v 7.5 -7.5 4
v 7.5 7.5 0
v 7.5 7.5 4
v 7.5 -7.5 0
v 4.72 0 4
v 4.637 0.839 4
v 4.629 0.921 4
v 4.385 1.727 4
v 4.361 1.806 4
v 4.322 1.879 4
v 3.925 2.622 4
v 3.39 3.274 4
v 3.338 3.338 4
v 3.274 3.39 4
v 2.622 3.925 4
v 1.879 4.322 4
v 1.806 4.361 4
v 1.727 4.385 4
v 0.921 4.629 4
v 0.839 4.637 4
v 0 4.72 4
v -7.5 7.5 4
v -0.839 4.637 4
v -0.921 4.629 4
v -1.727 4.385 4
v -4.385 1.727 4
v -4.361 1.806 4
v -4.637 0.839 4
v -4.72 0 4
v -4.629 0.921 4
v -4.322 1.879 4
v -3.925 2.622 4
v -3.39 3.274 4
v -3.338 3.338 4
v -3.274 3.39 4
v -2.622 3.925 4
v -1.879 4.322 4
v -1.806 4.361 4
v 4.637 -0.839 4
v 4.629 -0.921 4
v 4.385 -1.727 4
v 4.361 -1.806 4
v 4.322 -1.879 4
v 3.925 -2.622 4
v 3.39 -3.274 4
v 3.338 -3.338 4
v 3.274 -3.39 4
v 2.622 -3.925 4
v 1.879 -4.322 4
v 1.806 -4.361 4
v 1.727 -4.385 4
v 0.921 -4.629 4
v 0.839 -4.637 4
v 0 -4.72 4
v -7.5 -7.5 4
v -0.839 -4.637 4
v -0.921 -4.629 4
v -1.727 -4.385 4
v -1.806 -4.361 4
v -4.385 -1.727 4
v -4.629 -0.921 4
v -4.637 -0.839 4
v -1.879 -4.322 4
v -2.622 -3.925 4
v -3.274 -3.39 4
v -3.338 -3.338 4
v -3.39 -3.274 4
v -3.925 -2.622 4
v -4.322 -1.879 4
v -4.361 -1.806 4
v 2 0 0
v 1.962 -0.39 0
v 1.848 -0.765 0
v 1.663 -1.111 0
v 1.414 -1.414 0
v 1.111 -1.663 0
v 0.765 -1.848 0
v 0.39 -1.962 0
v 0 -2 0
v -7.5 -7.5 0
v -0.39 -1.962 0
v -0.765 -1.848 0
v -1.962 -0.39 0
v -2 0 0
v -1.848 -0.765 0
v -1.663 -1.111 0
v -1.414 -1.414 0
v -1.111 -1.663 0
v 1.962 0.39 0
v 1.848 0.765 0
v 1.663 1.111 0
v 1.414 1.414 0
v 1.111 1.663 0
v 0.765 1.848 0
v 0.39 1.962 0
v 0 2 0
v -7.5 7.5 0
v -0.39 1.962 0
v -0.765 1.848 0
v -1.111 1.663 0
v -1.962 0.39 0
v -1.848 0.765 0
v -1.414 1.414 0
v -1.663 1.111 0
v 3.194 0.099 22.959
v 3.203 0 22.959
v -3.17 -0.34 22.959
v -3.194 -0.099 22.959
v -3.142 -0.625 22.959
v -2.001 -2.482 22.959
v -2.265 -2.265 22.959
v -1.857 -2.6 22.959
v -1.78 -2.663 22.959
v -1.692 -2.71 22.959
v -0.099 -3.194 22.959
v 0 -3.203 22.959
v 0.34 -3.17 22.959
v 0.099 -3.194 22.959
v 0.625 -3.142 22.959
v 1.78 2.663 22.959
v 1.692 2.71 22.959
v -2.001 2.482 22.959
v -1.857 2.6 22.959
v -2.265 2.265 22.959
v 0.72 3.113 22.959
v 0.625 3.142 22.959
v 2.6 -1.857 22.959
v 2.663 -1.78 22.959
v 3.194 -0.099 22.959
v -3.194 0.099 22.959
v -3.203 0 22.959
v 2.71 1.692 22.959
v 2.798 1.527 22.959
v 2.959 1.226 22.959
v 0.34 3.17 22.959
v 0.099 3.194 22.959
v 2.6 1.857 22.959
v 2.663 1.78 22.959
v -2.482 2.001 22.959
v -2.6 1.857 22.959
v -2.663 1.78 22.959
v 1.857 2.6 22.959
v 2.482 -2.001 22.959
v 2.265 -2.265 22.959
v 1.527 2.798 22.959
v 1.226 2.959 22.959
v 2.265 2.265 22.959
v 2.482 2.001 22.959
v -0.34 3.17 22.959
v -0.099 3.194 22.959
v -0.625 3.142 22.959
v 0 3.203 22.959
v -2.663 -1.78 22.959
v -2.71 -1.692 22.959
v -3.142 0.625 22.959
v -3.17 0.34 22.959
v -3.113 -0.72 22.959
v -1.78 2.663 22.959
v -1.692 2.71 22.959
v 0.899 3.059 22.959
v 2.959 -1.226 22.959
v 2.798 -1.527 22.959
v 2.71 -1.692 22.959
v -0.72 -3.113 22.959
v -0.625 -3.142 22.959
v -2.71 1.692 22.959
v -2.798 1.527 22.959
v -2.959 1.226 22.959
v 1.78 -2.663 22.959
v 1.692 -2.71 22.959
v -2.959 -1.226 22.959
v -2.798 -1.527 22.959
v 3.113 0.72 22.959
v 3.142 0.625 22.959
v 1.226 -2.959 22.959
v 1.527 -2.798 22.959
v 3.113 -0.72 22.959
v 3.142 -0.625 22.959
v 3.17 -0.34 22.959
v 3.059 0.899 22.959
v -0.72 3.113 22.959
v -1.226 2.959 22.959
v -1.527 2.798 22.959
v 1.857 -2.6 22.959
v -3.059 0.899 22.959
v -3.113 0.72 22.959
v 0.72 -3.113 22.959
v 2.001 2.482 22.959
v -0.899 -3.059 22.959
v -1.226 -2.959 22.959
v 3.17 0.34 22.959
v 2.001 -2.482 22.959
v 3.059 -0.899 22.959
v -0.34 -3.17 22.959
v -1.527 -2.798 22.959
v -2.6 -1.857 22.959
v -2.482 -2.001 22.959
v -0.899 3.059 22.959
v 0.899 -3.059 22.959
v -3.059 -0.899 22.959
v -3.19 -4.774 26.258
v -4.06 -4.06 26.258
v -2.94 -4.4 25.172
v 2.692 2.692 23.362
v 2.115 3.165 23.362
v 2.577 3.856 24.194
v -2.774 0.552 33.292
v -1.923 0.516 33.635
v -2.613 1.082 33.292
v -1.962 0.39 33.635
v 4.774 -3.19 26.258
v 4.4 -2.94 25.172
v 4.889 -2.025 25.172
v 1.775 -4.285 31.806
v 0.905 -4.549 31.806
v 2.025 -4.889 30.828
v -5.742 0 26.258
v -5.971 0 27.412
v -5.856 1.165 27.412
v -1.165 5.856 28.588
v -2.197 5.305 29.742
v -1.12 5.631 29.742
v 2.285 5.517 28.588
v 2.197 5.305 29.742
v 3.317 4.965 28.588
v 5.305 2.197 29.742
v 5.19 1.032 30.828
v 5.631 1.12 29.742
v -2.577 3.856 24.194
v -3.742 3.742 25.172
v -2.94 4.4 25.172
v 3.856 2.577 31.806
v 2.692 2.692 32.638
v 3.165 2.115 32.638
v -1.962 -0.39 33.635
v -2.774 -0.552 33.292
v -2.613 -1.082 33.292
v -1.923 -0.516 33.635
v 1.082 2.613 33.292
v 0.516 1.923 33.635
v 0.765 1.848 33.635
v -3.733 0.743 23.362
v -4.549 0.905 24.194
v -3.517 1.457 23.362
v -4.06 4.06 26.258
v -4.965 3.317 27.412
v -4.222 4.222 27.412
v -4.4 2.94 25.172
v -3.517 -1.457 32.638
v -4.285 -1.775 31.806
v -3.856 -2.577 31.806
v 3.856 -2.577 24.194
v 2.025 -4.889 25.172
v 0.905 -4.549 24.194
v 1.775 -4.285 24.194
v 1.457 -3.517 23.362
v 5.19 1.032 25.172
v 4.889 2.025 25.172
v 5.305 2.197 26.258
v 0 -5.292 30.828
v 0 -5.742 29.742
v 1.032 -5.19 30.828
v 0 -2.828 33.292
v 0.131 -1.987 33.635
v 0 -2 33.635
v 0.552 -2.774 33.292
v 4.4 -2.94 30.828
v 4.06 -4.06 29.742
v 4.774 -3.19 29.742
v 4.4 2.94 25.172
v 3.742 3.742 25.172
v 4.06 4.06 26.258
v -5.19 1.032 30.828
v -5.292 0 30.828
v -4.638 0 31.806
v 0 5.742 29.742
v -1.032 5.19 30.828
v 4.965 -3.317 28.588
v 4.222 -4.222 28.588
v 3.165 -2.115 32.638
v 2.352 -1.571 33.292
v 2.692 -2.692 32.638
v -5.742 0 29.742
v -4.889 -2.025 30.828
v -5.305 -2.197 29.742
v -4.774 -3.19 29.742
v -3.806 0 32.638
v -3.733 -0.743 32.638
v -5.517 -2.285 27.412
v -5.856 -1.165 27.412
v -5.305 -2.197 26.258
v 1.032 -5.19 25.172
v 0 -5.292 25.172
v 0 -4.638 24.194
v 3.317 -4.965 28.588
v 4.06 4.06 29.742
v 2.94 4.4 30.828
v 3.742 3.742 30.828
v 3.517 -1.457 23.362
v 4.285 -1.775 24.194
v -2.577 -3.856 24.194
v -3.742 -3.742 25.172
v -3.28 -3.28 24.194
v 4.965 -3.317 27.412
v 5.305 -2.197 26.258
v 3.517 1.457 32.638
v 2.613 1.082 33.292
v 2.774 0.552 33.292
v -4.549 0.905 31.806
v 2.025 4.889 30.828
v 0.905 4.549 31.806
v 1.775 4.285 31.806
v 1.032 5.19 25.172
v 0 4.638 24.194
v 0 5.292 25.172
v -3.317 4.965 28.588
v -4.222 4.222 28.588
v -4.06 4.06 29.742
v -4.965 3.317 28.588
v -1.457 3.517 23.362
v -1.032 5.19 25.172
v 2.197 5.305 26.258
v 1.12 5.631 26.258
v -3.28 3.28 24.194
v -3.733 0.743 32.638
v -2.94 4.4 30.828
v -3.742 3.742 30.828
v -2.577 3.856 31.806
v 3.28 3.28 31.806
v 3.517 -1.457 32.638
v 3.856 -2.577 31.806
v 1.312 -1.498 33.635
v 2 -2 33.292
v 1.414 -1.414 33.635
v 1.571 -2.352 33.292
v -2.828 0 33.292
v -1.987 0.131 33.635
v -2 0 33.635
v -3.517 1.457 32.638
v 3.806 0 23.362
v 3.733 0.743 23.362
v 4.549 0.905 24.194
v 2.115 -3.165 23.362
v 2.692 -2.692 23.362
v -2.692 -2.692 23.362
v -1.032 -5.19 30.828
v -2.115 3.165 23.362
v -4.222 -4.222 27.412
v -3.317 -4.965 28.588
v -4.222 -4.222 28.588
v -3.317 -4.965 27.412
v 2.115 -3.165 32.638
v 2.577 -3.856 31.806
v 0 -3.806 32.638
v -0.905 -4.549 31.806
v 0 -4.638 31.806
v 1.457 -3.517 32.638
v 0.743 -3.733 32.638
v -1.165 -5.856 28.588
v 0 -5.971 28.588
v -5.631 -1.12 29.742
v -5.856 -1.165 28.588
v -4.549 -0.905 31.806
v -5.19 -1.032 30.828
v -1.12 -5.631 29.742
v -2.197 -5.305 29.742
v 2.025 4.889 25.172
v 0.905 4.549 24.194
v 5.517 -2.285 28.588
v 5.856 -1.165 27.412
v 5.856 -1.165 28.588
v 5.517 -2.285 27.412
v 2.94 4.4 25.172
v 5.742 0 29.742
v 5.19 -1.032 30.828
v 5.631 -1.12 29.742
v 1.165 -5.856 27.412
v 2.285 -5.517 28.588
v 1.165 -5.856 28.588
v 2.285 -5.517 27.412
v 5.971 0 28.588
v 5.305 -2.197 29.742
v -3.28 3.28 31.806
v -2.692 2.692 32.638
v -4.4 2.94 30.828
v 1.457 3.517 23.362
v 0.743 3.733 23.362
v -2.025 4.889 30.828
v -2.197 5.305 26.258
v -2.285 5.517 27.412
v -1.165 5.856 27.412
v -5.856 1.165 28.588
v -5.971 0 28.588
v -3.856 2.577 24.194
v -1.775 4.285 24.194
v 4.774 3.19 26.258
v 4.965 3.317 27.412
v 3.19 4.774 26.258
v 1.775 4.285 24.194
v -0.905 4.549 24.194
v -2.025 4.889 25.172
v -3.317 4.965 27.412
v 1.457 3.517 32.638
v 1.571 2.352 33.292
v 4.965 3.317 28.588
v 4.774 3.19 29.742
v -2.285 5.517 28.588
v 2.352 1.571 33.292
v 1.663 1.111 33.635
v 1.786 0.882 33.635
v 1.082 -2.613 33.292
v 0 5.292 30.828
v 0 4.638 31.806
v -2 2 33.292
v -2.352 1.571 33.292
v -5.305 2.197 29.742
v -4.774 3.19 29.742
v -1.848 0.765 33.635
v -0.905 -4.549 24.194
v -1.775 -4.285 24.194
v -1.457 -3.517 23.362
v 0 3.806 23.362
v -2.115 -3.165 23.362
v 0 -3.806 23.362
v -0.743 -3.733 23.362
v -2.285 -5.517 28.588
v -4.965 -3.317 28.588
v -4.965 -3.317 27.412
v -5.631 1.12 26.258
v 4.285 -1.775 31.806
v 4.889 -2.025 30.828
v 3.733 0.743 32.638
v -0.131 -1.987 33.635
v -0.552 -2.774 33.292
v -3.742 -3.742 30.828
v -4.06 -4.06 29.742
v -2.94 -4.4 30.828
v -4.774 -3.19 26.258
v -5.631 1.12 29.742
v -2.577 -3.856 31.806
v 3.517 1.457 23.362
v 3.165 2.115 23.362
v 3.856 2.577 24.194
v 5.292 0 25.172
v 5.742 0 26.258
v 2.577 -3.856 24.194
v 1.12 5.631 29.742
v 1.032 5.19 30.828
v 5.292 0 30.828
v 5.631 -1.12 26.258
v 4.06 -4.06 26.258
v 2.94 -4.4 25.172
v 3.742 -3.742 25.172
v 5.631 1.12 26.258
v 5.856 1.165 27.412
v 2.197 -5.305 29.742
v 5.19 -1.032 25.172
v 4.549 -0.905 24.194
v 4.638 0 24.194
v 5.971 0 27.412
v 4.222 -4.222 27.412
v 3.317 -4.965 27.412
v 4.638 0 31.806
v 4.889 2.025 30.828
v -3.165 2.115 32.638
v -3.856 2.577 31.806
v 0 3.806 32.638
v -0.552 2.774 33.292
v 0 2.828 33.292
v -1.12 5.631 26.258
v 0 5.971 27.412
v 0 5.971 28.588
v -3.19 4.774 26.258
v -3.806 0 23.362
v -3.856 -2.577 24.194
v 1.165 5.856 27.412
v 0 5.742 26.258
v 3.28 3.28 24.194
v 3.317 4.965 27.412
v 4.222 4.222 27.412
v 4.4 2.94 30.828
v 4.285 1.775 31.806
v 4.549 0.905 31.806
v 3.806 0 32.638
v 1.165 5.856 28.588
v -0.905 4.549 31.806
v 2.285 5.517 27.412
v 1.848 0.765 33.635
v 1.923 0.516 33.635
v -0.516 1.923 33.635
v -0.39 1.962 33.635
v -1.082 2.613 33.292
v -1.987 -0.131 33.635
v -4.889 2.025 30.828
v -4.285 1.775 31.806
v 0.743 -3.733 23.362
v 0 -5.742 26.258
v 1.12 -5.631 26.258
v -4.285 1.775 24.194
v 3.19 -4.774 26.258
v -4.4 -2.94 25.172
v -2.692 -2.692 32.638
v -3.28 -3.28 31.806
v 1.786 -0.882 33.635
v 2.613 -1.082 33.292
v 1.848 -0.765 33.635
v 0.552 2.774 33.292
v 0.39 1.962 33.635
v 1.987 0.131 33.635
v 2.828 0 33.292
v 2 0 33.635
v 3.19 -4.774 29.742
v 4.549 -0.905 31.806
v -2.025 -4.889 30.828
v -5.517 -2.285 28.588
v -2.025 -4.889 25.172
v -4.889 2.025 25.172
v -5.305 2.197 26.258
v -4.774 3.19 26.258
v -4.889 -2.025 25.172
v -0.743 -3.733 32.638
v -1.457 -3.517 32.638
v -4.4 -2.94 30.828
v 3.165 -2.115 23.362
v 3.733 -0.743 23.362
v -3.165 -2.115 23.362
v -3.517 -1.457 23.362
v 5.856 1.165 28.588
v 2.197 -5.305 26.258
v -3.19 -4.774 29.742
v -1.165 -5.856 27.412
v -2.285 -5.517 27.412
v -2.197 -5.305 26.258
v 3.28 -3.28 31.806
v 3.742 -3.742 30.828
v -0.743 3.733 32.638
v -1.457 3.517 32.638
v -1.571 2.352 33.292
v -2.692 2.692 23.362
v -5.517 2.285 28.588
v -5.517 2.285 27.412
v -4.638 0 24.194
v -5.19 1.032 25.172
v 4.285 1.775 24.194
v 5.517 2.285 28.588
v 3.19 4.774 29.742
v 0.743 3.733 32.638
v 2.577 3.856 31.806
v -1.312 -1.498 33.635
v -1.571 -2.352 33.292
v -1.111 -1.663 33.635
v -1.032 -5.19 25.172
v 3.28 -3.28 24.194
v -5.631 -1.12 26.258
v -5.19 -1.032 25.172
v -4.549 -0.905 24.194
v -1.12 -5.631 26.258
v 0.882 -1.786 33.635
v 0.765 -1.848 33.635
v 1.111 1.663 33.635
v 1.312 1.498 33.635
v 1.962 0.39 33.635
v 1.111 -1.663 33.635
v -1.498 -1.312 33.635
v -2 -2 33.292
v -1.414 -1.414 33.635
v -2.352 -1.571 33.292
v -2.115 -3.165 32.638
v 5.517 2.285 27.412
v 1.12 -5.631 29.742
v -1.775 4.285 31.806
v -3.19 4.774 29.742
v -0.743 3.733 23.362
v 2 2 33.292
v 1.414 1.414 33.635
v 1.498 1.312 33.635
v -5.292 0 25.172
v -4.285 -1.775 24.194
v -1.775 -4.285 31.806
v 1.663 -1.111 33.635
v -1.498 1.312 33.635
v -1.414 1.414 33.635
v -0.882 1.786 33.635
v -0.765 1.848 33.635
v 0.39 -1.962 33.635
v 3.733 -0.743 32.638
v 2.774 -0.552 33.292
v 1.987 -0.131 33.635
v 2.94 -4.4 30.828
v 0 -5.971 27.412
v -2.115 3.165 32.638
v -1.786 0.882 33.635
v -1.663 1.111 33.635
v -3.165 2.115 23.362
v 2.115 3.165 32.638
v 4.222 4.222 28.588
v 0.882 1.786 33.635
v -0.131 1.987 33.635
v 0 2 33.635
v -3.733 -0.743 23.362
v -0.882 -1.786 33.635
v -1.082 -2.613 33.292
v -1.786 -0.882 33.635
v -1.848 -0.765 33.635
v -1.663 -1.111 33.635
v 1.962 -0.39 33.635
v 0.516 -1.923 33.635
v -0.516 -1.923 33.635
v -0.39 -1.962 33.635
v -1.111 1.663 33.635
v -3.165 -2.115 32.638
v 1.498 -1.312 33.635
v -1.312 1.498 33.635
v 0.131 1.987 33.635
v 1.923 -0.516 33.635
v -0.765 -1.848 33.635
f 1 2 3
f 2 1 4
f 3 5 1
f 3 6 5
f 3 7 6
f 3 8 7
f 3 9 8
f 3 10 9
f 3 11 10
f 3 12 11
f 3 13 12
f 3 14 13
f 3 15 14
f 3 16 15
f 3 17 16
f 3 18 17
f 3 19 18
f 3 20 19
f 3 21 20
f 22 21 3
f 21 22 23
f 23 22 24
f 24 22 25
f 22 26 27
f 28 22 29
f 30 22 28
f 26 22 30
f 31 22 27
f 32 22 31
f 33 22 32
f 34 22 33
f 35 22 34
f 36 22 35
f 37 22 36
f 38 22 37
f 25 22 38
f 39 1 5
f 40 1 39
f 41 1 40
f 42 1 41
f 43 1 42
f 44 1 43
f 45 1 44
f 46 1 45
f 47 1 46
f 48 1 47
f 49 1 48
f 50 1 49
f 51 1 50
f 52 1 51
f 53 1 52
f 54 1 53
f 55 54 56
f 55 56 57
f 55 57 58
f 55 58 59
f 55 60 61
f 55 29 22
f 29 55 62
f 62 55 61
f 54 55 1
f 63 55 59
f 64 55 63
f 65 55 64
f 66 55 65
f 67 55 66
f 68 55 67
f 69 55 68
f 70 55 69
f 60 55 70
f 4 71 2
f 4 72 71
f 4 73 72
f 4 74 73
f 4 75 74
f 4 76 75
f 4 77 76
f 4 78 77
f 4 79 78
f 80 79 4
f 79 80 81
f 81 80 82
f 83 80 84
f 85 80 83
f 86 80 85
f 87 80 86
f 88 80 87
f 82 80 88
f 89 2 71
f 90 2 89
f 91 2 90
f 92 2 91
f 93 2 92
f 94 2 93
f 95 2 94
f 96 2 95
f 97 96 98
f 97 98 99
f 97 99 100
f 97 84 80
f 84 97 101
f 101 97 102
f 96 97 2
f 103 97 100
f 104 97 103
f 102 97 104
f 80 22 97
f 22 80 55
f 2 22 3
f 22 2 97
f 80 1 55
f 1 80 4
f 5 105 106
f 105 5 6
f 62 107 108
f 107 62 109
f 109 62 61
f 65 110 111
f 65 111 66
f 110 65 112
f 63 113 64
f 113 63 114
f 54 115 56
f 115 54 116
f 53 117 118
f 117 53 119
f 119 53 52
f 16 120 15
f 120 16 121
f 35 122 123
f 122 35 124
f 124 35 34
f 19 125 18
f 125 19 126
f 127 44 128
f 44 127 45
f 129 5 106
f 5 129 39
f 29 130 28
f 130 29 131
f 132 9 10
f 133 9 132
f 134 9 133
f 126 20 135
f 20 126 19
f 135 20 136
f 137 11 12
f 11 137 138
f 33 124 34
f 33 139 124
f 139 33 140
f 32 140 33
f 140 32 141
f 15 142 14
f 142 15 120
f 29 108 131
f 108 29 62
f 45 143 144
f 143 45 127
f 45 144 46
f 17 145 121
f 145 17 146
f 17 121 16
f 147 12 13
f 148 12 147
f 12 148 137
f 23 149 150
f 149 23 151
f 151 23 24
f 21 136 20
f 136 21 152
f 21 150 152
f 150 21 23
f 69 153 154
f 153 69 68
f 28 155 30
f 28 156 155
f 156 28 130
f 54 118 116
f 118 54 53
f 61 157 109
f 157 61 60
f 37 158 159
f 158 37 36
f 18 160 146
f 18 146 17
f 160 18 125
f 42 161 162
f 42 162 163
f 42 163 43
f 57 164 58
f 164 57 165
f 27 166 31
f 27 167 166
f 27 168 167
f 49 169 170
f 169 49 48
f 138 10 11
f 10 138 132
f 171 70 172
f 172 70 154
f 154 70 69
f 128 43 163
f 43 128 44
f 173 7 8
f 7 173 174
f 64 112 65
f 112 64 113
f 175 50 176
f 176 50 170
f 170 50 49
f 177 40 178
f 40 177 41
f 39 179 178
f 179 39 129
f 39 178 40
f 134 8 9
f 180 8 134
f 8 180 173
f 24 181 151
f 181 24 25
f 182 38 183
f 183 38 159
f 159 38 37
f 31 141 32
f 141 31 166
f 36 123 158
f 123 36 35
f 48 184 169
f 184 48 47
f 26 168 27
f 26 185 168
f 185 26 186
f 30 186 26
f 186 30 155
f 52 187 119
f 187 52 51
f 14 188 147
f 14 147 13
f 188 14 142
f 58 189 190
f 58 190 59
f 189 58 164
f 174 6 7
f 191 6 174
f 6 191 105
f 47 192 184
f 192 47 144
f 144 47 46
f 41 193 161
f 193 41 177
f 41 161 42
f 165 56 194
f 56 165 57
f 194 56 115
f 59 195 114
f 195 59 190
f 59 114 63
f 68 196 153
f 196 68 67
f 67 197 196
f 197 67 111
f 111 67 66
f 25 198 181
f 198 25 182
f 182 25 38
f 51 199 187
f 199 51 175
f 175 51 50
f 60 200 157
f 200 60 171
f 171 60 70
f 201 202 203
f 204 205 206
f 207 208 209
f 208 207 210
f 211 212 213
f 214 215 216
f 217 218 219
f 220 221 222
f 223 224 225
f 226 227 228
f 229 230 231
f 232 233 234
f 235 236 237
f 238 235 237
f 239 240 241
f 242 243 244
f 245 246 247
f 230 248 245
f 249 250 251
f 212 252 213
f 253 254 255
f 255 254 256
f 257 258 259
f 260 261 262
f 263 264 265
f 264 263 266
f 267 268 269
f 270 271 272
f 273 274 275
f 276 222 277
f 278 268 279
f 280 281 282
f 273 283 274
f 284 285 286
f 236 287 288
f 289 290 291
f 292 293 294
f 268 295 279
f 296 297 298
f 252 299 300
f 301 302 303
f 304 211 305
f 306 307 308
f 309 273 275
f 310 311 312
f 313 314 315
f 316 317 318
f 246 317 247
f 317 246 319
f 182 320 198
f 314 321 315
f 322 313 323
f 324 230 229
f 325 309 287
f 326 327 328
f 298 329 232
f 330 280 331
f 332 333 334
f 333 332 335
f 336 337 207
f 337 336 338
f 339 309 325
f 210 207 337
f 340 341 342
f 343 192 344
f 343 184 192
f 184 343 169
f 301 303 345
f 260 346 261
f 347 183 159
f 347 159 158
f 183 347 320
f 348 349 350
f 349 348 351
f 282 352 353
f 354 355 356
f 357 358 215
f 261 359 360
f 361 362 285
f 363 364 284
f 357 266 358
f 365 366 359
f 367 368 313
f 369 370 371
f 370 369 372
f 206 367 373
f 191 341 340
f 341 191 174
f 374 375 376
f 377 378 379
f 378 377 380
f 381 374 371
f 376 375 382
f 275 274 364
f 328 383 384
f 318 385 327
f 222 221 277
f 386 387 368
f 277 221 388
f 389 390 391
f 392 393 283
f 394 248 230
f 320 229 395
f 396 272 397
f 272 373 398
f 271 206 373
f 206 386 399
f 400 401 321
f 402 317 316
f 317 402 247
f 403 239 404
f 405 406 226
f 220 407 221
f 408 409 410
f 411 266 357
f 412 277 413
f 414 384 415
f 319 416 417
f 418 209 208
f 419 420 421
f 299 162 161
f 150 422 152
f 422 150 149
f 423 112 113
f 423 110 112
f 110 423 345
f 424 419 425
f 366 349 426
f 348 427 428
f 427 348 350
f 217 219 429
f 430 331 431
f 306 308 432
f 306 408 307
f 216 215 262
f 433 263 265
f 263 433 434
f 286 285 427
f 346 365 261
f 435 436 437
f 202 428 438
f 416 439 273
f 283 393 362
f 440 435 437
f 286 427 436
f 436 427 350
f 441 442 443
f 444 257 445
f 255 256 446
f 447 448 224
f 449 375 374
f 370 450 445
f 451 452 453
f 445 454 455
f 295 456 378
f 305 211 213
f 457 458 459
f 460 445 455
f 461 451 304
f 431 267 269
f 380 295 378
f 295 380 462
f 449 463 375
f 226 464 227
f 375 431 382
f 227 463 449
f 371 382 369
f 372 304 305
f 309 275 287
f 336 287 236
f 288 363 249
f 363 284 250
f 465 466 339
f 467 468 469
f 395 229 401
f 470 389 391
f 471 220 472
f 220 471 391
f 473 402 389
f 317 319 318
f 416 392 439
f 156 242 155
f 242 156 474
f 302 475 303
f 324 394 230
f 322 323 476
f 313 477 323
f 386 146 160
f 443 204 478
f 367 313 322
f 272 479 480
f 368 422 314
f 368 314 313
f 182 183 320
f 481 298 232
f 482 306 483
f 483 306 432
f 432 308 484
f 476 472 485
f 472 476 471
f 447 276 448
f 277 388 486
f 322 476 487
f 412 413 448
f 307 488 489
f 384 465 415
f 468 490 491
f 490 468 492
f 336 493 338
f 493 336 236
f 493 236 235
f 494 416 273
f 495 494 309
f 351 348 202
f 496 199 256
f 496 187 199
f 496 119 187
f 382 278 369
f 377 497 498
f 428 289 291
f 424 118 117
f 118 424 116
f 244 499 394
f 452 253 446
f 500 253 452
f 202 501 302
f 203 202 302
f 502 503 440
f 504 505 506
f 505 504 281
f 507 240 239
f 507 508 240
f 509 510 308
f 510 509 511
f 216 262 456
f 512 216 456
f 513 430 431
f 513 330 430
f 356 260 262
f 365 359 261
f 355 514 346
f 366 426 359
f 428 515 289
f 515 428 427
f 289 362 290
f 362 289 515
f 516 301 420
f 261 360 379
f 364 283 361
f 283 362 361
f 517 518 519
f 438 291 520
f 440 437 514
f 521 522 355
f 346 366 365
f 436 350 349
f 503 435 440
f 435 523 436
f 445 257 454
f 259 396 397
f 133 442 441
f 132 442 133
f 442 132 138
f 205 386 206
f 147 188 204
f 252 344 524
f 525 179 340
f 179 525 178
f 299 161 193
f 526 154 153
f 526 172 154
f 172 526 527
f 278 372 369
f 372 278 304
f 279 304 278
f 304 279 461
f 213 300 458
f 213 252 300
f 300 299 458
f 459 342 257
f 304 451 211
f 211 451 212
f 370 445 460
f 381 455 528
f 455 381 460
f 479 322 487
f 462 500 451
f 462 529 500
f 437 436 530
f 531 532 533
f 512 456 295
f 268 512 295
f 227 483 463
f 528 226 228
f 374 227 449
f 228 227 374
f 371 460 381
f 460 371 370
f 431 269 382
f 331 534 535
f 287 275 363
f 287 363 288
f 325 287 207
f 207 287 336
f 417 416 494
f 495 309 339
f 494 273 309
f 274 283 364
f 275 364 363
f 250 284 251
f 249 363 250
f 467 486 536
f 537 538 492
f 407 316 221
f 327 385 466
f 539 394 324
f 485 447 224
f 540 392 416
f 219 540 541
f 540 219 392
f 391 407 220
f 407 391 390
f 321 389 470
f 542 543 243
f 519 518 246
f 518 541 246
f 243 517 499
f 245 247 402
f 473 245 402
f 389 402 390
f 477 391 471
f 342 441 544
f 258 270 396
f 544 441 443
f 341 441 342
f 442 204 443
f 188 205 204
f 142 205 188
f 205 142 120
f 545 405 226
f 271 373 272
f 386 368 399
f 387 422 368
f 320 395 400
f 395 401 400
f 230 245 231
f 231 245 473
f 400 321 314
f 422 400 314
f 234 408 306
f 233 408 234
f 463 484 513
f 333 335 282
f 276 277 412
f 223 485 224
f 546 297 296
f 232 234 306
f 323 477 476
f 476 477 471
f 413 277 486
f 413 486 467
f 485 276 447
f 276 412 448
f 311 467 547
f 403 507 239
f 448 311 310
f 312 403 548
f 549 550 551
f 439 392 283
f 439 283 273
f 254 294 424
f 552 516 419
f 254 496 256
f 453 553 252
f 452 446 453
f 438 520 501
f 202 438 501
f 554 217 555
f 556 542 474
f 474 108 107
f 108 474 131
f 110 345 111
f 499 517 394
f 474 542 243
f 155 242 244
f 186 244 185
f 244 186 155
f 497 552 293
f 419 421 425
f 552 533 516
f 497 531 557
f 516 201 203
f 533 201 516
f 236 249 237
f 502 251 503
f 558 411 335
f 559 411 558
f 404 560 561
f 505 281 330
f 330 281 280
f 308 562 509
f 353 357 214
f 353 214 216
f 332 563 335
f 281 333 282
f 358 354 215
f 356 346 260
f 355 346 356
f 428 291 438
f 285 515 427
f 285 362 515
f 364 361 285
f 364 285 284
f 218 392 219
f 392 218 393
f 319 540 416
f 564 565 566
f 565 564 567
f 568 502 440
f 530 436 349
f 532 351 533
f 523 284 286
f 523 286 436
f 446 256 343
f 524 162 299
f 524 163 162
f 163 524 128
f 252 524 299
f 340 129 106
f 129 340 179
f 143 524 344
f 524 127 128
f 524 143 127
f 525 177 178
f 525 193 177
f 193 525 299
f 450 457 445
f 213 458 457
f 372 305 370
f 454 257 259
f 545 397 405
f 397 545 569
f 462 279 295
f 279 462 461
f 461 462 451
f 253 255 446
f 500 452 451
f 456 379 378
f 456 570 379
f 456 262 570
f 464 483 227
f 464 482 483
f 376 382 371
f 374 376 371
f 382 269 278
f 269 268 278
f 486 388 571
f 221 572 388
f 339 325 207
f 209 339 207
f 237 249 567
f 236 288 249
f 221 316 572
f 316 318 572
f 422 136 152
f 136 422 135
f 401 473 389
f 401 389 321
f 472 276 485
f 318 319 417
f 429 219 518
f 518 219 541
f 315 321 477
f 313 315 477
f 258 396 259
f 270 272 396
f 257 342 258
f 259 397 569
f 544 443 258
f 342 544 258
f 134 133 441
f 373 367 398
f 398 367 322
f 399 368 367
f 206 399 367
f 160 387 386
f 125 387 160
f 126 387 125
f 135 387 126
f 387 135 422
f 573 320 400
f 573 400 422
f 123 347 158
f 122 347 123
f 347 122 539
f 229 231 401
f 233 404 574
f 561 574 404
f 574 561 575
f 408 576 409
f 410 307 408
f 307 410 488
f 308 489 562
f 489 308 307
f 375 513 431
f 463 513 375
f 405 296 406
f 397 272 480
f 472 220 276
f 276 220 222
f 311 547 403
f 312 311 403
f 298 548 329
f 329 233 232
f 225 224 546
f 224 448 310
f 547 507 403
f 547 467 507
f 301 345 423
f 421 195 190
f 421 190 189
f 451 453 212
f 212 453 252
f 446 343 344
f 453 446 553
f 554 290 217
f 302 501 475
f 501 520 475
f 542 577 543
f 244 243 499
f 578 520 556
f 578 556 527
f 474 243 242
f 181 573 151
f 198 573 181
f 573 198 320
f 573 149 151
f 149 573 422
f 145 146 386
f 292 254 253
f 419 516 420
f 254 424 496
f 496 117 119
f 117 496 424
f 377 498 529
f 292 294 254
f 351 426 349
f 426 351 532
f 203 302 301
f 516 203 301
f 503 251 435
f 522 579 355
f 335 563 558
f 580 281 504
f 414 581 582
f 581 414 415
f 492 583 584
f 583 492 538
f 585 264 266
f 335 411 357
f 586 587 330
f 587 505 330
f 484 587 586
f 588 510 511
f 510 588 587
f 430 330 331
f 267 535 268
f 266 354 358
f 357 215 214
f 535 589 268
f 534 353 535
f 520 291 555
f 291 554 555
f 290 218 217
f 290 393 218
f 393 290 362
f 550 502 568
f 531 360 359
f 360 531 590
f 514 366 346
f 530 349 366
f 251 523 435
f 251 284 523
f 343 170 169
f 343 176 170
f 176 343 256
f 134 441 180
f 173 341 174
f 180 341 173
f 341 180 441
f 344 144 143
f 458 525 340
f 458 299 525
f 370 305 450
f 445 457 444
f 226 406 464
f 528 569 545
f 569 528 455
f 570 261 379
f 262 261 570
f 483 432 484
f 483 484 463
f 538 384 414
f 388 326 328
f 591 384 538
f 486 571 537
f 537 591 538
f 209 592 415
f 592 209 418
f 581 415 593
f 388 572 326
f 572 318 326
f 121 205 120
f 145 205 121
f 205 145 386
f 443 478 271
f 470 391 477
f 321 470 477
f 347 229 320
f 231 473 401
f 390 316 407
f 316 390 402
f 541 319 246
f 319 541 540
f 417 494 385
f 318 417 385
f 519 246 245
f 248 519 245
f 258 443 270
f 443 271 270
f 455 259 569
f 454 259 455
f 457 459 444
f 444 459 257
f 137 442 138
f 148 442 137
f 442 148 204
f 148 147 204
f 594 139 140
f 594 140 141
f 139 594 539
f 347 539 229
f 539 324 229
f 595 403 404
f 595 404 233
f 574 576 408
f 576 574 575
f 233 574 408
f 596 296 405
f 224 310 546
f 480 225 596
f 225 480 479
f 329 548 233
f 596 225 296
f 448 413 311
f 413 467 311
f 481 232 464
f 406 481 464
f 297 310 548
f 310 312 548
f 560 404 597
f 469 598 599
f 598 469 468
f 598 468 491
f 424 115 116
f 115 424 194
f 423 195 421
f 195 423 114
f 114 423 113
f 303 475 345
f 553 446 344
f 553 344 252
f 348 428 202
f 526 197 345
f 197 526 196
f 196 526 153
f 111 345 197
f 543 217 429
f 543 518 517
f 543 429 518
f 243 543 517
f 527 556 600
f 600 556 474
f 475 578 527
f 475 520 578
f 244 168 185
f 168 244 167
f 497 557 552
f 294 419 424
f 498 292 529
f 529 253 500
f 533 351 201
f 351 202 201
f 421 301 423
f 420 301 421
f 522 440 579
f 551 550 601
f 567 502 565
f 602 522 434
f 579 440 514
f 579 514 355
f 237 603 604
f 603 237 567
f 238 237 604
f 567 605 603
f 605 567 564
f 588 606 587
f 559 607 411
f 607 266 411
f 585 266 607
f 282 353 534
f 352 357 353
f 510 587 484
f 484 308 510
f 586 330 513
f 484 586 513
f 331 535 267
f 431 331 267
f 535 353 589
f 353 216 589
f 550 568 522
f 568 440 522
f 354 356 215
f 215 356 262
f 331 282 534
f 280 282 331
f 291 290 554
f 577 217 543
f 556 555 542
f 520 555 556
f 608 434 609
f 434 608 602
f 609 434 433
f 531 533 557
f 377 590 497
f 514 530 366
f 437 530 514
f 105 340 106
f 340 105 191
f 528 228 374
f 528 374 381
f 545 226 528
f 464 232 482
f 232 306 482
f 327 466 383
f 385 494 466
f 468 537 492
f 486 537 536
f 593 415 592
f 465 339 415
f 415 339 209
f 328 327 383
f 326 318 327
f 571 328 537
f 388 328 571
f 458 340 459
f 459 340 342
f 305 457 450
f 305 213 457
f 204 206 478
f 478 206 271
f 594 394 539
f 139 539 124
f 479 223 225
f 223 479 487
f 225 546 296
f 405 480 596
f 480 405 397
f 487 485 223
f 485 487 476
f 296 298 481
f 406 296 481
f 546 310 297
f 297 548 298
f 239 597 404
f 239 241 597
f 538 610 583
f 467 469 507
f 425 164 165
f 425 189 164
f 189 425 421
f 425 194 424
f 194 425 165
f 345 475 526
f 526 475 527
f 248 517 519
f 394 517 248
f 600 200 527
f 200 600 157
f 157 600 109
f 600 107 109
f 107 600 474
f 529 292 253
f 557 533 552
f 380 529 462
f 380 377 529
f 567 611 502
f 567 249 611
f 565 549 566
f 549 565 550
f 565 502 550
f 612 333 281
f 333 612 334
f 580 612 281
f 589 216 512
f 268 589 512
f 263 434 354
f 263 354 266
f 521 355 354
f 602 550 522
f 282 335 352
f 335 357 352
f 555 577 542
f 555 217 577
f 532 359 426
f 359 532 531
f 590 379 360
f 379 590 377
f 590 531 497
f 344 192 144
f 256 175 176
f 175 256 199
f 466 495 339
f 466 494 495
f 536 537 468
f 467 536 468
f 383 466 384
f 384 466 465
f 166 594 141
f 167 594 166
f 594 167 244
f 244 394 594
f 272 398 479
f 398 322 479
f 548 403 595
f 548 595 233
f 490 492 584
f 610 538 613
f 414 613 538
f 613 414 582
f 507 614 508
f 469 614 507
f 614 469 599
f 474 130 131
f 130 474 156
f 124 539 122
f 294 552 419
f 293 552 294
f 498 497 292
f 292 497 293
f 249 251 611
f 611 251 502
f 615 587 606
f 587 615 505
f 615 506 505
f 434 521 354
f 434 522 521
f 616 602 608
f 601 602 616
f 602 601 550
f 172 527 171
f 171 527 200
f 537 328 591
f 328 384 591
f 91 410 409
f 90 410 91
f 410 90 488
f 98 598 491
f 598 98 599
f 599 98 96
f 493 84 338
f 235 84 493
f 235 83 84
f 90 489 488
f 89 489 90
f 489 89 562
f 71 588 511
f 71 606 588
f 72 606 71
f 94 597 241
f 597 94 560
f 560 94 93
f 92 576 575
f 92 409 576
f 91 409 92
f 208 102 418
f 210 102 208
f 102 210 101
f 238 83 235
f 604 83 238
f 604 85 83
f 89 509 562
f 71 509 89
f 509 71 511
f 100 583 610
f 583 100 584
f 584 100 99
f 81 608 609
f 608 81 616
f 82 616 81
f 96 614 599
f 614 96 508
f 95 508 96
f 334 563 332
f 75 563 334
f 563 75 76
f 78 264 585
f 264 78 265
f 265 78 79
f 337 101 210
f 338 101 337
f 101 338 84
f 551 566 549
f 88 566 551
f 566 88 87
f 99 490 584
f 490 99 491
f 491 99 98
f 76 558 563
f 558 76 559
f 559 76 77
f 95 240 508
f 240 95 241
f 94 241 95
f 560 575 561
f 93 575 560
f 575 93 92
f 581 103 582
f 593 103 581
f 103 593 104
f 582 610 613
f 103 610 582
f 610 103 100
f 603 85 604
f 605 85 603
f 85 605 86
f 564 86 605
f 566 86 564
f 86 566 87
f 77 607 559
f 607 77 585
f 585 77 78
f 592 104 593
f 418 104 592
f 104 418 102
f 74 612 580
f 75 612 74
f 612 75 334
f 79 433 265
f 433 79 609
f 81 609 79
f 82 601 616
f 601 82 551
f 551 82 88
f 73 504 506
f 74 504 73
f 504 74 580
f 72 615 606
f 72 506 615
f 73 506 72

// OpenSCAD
// A more complicated 3D shape in OpenSCAD
$fn=32;

difference() {
    // main shape
    union() {
        translate( [ 0, 0,  2 ] ) cube( [ 15, 15, 4 ], center=true );
        translate( [ 0, 0, 13 ] ) cylinder( h=25, r1=5, r2=3, center=true );
        translate( [ 0, 0, 28 ] ) sphere( r=6 );
    }
    // hole through center
    translate( [ 0, 0, 17 ] ) cylinder( h=35, r=2, center=true );
}
